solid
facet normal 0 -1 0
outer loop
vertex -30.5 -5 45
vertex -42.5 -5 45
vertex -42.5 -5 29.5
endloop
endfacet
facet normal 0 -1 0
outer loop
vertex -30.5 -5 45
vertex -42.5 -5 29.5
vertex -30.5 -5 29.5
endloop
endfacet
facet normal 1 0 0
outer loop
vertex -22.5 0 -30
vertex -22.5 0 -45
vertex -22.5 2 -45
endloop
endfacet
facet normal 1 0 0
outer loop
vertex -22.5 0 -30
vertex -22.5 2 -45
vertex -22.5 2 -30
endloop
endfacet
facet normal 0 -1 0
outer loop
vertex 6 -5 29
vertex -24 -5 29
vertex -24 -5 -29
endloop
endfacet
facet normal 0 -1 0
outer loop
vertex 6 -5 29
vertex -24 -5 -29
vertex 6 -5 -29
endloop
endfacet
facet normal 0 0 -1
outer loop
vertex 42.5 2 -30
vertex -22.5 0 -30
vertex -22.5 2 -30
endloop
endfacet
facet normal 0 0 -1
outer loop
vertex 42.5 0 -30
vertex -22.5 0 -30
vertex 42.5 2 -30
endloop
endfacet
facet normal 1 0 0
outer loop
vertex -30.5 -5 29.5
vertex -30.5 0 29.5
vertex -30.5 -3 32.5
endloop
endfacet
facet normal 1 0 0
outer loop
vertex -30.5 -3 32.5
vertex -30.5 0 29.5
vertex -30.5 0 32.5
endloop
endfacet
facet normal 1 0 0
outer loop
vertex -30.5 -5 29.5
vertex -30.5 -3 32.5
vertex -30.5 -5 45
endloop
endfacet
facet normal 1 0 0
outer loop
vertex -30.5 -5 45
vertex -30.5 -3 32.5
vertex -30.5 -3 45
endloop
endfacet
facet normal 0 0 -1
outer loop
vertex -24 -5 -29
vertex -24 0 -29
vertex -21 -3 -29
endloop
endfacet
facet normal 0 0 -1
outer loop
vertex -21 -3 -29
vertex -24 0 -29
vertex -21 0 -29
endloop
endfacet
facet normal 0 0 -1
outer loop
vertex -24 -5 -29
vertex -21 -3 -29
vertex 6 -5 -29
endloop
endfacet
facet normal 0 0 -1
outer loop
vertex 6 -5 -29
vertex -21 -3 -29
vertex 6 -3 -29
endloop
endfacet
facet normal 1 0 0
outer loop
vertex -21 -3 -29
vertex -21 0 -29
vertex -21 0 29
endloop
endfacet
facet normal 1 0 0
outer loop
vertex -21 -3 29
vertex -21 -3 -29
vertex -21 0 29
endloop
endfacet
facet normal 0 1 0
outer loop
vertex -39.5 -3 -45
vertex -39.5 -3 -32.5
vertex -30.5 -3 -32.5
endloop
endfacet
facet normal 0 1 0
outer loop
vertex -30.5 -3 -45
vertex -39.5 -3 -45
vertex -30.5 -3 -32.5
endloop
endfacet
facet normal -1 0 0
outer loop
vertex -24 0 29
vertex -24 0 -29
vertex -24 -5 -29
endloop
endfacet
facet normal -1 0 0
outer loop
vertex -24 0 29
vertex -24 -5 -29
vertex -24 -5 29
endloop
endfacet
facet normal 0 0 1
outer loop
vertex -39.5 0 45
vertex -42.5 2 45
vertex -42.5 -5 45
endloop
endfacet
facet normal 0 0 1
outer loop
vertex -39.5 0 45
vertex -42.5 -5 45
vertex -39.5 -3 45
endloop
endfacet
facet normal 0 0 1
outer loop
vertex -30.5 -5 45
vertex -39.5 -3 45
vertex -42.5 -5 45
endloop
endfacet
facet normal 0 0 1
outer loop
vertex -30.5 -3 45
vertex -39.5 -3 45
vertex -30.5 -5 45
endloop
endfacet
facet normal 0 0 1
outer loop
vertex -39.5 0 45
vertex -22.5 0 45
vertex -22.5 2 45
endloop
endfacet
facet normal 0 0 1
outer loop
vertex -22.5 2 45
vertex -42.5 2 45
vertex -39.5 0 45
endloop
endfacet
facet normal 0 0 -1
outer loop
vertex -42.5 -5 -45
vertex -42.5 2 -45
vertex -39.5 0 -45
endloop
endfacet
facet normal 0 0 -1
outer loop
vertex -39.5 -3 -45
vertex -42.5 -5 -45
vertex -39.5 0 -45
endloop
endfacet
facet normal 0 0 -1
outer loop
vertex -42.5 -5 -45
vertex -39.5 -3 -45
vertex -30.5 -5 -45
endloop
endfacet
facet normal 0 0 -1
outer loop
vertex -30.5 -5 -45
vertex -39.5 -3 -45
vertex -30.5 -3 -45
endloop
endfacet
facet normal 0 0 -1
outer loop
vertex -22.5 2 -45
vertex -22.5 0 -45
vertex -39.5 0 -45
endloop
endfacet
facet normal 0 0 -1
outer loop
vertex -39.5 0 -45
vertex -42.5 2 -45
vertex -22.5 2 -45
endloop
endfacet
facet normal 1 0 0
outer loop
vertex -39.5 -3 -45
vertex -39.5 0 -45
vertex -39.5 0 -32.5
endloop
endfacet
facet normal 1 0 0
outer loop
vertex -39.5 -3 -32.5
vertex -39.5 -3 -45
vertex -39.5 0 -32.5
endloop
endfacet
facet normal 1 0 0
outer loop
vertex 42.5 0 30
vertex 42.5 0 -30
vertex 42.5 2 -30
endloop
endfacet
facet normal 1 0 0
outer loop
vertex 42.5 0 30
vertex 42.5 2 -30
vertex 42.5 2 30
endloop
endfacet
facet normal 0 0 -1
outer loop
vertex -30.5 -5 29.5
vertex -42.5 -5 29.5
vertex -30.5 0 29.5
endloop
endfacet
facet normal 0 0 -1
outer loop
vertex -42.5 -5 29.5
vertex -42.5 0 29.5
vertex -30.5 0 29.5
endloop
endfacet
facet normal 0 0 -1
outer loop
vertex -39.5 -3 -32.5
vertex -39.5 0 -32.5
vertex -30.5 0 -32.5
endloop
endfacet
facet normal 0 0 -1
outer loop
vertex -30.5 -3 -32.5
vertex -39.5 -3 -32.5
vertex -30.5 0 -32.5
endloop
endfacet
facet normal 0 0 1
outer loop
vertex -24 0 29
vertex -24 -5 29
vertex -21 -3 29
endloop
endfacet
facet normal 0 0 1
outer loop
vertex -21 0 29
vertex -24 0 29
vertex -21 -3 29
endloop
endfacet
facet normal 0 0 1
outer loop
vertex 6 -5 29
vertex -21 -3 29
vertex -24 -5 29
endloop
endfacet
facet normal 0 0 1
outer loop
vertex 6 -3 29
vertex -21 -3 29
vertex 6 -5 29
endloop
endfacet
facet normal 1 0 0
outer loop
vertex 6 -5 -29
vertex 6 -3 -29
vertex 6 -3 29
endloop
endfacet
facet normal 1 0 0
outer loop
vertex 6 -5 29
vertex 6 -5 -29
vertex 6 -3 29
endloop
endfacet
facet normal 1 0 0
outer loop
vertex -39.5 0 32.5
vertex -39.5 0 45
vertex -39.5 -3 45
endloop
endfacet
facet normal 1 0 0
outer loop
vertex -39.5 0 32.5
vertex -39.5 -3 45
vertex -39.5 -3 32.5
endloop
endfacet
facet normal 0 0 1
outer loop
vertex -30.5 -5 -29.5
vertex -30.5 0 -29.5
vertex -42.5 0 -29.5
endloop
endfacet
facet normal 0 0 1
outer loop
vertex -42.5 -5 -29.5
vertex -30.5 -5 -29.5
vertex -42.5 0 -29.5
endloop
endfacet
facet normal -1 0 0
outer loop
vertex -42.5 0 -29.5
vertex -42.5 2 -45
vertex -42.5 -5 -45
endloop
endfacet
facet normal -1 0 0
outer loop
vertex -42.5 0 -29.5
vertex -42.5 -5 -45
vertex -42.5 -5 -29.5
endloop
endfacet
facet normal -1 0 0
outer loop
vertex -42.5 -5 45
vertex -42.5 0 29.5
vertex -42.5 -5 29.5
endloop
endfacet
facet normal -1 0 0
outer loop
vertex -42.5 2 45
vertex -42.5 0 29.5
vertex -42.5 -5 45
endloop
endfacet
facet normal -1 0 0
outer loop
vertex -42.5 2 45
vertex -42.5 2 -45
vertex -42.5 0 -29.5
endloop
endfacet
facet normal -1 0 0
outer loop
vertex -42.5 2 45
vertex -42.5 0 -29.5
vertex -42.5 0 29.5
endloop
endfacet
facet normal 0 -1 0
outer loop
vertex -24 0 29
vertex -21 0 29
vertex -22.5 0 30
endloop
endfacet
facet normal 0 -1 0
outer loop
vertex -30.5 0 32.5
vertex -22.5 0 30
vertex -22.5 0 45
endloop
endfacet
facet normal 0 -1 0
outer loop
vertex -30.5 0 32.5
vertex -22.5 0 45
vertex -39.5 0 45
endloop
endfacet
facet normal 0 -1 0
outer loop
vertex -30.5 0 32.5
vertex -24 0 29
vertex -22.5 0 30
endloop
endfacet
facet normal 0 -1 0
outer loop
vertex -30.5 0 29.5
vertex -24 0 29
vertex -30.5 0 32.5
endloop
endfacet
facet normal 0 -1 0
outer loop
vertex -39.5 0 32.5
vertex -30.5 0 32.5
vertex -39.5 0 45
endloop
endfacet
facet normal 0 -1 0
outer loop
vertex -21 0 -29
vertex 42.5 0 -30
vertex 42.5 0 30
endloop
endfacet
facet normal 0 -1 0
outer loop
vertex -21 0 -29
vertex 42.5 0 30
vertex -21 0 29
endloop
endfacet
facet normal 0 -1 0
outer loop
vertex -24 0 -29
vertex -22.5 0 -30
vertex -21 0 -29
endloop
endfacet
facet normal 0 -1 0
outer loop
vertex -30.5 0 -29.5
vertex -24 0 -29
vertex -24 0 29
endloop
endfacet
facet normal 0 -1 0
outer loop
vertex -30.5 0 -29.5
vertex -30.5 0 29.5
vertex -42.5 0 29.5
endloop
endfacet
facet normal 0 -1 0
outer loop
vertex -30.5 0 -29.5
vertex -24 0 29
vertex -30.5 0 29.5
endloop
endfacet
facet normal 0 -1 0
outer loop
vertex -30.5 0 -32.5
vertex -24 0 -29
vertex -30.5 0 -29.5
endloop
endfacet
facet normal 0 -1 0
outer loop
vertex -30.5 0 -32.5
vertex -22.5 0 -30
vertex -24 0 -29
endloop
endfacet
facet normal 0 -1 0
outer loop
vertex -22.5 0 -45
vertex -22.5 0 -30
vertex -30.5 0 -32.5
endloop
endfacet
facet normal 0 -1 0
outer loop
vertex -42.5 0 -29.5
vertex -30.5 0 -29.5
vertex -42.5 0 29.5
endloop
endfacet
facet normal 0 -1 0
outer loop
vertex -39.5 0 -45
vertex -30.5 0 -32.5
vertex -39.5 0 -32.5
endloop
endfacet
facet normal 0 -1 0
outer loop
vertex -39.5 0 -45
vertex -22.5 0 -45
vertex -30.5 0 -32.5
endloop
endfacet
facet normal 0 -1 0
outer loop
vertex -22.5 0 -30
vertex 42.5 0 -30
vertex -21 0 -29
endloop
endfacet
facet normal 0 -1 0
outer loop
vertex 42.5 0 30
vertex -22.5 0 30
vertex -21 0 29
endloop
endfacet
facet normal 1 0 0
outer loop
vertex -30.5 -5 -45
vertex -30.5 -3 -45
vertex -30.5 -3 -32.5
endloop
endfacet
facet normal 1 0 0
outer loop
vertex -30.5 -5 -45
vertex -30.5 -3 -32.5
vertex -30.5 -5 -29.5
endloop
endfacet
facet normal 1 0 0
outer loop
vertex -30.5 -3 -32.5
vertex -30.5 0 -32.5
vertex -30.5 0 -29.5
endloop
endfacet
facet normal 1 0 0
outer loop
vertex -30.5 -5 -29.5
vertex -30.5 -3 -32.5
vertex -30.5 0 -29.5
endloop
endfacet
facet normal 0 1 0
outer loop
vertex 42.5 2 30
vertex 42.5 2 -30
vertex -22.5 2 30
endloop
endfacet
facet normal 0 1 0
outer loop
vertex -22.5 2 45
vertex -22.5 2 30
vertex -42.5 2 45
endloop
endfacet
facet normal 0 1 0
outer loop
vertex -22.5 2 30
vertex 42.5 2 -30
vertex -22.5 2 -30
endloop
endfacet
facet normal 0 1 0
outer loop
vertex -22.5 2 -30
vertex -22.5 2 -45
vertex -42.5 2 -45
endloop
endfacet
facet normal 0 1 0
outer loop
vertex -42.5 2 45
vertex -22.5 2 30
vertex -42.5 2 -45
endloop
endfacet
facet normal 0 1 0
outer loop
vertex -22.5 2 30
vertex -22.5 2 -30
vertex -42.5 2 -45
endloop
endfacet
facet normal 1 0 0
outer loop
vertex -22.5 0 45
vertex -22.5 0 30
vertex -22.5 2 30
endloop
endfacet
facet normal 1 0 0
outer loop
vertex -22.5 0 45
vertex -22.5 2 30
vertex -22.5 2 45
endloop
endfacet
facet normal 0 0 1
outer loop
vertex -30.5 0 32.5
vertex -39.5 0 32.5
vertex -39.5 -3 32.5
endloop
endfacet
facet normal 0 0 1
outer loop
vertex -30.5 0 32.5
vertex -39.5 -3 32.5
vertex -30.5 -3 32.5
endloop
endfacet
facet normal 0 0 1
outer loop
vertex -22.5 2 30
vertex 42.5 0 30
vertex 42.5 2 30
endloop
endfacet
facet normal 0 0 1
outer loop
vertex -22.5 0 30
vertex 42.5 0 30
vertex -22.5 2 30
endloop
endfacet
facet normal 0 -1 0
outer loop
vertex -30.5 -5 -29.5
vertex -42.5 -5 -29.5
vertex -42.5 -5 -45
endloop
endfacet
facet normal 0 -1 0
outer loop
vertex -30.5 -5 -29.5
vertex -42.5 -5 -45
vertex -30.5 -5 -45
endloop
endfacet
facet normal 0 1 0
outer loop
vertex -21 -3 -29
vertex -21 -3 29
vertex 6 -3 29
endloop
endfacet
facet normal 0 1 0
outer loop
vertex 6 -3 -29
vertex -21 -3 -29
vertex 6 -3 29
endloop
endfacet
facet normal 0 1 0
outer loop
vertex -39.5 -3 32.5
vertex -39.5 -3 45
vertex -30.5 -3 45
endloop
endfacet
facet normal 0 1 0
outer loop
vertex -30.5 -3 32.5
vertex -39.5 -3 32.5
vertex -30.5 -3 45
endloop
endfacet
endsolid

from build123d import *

# Parameters (mm, degrees)
BOSS_EXTRUDE1_DEPTH = 2
SKETCH2_W           = 3
SKETCH2_H           = 58
BOSS_EXTRUDE2_DEPTH = 3
SKETCH3_W           = 12
SKETCH3_H           = 15.5
SKETCH3_W_2         = 30
SKETCH3_H_2         = 58
BOSS_EXTRUDE3_DEPTH = 2


with BuildPart() as part:
    # Sketch1 → Boss-Extrude1 (new body)
    with BuildSketch(Plane(origin=(0, 0, 0), x_dir=(1, 0, 0), z_dir=(0, 1, 0))):
        Polygon((-22.5, 30), (42.5, 30), (42.5, -30), (-22.5, -30), (-22.5, -45), (-42.5, -45), (-42.5, -30), (-42.5, 30), (-42.5, 45), (-22.5, 45), align=None)
    extrude(amount=BOSS_EXTRUDE1_DEPTH)

    # Sketch2 → Boss-Extrude2 (add)
    with BuildSketch(Plane.XZ):
        Polygon((-42.5, -45), (-39.5, -45), (-39.5, -32.5), (-30.5, -32.5), (-30.5, -29.5), (-40.524301108, -29.5), (-42.5, -29.5), align=None)
        with Locations((-22.5, 0)):
            Rectangle(SKETCH2_W, SKETCH2_H)
        Polygon((-42.5, 45), (-39.5, 45), (-39.5, 32.5), (-30.5, 32.5), (-30.5, 29.5), (-40.524301108, 29.5), (-42.5, 29.5), align=None)
    extrude(amount=BOSS_EXTRUDE2_DEPTH)

    # Sketch3 → Boss-Extrude3 (add)
    with BuildSketch(Plane.XZ.offset(3)):
        with Locations((-36.5, 37.25)):
            Rectangle(SKETCH3_W, SKETCH3_H)
        with Locations((-36.5, -37.25)):
            Rectangle(SKETCH3_W, SKETCH3_H)
        with Locations((-9, 0)):
            Rectangle(SKETCH3_W_2, SKETCH3_H_2)
    extrude(amount=BOSS_EXTRUDE3_DEPTH)


solid = part.part
